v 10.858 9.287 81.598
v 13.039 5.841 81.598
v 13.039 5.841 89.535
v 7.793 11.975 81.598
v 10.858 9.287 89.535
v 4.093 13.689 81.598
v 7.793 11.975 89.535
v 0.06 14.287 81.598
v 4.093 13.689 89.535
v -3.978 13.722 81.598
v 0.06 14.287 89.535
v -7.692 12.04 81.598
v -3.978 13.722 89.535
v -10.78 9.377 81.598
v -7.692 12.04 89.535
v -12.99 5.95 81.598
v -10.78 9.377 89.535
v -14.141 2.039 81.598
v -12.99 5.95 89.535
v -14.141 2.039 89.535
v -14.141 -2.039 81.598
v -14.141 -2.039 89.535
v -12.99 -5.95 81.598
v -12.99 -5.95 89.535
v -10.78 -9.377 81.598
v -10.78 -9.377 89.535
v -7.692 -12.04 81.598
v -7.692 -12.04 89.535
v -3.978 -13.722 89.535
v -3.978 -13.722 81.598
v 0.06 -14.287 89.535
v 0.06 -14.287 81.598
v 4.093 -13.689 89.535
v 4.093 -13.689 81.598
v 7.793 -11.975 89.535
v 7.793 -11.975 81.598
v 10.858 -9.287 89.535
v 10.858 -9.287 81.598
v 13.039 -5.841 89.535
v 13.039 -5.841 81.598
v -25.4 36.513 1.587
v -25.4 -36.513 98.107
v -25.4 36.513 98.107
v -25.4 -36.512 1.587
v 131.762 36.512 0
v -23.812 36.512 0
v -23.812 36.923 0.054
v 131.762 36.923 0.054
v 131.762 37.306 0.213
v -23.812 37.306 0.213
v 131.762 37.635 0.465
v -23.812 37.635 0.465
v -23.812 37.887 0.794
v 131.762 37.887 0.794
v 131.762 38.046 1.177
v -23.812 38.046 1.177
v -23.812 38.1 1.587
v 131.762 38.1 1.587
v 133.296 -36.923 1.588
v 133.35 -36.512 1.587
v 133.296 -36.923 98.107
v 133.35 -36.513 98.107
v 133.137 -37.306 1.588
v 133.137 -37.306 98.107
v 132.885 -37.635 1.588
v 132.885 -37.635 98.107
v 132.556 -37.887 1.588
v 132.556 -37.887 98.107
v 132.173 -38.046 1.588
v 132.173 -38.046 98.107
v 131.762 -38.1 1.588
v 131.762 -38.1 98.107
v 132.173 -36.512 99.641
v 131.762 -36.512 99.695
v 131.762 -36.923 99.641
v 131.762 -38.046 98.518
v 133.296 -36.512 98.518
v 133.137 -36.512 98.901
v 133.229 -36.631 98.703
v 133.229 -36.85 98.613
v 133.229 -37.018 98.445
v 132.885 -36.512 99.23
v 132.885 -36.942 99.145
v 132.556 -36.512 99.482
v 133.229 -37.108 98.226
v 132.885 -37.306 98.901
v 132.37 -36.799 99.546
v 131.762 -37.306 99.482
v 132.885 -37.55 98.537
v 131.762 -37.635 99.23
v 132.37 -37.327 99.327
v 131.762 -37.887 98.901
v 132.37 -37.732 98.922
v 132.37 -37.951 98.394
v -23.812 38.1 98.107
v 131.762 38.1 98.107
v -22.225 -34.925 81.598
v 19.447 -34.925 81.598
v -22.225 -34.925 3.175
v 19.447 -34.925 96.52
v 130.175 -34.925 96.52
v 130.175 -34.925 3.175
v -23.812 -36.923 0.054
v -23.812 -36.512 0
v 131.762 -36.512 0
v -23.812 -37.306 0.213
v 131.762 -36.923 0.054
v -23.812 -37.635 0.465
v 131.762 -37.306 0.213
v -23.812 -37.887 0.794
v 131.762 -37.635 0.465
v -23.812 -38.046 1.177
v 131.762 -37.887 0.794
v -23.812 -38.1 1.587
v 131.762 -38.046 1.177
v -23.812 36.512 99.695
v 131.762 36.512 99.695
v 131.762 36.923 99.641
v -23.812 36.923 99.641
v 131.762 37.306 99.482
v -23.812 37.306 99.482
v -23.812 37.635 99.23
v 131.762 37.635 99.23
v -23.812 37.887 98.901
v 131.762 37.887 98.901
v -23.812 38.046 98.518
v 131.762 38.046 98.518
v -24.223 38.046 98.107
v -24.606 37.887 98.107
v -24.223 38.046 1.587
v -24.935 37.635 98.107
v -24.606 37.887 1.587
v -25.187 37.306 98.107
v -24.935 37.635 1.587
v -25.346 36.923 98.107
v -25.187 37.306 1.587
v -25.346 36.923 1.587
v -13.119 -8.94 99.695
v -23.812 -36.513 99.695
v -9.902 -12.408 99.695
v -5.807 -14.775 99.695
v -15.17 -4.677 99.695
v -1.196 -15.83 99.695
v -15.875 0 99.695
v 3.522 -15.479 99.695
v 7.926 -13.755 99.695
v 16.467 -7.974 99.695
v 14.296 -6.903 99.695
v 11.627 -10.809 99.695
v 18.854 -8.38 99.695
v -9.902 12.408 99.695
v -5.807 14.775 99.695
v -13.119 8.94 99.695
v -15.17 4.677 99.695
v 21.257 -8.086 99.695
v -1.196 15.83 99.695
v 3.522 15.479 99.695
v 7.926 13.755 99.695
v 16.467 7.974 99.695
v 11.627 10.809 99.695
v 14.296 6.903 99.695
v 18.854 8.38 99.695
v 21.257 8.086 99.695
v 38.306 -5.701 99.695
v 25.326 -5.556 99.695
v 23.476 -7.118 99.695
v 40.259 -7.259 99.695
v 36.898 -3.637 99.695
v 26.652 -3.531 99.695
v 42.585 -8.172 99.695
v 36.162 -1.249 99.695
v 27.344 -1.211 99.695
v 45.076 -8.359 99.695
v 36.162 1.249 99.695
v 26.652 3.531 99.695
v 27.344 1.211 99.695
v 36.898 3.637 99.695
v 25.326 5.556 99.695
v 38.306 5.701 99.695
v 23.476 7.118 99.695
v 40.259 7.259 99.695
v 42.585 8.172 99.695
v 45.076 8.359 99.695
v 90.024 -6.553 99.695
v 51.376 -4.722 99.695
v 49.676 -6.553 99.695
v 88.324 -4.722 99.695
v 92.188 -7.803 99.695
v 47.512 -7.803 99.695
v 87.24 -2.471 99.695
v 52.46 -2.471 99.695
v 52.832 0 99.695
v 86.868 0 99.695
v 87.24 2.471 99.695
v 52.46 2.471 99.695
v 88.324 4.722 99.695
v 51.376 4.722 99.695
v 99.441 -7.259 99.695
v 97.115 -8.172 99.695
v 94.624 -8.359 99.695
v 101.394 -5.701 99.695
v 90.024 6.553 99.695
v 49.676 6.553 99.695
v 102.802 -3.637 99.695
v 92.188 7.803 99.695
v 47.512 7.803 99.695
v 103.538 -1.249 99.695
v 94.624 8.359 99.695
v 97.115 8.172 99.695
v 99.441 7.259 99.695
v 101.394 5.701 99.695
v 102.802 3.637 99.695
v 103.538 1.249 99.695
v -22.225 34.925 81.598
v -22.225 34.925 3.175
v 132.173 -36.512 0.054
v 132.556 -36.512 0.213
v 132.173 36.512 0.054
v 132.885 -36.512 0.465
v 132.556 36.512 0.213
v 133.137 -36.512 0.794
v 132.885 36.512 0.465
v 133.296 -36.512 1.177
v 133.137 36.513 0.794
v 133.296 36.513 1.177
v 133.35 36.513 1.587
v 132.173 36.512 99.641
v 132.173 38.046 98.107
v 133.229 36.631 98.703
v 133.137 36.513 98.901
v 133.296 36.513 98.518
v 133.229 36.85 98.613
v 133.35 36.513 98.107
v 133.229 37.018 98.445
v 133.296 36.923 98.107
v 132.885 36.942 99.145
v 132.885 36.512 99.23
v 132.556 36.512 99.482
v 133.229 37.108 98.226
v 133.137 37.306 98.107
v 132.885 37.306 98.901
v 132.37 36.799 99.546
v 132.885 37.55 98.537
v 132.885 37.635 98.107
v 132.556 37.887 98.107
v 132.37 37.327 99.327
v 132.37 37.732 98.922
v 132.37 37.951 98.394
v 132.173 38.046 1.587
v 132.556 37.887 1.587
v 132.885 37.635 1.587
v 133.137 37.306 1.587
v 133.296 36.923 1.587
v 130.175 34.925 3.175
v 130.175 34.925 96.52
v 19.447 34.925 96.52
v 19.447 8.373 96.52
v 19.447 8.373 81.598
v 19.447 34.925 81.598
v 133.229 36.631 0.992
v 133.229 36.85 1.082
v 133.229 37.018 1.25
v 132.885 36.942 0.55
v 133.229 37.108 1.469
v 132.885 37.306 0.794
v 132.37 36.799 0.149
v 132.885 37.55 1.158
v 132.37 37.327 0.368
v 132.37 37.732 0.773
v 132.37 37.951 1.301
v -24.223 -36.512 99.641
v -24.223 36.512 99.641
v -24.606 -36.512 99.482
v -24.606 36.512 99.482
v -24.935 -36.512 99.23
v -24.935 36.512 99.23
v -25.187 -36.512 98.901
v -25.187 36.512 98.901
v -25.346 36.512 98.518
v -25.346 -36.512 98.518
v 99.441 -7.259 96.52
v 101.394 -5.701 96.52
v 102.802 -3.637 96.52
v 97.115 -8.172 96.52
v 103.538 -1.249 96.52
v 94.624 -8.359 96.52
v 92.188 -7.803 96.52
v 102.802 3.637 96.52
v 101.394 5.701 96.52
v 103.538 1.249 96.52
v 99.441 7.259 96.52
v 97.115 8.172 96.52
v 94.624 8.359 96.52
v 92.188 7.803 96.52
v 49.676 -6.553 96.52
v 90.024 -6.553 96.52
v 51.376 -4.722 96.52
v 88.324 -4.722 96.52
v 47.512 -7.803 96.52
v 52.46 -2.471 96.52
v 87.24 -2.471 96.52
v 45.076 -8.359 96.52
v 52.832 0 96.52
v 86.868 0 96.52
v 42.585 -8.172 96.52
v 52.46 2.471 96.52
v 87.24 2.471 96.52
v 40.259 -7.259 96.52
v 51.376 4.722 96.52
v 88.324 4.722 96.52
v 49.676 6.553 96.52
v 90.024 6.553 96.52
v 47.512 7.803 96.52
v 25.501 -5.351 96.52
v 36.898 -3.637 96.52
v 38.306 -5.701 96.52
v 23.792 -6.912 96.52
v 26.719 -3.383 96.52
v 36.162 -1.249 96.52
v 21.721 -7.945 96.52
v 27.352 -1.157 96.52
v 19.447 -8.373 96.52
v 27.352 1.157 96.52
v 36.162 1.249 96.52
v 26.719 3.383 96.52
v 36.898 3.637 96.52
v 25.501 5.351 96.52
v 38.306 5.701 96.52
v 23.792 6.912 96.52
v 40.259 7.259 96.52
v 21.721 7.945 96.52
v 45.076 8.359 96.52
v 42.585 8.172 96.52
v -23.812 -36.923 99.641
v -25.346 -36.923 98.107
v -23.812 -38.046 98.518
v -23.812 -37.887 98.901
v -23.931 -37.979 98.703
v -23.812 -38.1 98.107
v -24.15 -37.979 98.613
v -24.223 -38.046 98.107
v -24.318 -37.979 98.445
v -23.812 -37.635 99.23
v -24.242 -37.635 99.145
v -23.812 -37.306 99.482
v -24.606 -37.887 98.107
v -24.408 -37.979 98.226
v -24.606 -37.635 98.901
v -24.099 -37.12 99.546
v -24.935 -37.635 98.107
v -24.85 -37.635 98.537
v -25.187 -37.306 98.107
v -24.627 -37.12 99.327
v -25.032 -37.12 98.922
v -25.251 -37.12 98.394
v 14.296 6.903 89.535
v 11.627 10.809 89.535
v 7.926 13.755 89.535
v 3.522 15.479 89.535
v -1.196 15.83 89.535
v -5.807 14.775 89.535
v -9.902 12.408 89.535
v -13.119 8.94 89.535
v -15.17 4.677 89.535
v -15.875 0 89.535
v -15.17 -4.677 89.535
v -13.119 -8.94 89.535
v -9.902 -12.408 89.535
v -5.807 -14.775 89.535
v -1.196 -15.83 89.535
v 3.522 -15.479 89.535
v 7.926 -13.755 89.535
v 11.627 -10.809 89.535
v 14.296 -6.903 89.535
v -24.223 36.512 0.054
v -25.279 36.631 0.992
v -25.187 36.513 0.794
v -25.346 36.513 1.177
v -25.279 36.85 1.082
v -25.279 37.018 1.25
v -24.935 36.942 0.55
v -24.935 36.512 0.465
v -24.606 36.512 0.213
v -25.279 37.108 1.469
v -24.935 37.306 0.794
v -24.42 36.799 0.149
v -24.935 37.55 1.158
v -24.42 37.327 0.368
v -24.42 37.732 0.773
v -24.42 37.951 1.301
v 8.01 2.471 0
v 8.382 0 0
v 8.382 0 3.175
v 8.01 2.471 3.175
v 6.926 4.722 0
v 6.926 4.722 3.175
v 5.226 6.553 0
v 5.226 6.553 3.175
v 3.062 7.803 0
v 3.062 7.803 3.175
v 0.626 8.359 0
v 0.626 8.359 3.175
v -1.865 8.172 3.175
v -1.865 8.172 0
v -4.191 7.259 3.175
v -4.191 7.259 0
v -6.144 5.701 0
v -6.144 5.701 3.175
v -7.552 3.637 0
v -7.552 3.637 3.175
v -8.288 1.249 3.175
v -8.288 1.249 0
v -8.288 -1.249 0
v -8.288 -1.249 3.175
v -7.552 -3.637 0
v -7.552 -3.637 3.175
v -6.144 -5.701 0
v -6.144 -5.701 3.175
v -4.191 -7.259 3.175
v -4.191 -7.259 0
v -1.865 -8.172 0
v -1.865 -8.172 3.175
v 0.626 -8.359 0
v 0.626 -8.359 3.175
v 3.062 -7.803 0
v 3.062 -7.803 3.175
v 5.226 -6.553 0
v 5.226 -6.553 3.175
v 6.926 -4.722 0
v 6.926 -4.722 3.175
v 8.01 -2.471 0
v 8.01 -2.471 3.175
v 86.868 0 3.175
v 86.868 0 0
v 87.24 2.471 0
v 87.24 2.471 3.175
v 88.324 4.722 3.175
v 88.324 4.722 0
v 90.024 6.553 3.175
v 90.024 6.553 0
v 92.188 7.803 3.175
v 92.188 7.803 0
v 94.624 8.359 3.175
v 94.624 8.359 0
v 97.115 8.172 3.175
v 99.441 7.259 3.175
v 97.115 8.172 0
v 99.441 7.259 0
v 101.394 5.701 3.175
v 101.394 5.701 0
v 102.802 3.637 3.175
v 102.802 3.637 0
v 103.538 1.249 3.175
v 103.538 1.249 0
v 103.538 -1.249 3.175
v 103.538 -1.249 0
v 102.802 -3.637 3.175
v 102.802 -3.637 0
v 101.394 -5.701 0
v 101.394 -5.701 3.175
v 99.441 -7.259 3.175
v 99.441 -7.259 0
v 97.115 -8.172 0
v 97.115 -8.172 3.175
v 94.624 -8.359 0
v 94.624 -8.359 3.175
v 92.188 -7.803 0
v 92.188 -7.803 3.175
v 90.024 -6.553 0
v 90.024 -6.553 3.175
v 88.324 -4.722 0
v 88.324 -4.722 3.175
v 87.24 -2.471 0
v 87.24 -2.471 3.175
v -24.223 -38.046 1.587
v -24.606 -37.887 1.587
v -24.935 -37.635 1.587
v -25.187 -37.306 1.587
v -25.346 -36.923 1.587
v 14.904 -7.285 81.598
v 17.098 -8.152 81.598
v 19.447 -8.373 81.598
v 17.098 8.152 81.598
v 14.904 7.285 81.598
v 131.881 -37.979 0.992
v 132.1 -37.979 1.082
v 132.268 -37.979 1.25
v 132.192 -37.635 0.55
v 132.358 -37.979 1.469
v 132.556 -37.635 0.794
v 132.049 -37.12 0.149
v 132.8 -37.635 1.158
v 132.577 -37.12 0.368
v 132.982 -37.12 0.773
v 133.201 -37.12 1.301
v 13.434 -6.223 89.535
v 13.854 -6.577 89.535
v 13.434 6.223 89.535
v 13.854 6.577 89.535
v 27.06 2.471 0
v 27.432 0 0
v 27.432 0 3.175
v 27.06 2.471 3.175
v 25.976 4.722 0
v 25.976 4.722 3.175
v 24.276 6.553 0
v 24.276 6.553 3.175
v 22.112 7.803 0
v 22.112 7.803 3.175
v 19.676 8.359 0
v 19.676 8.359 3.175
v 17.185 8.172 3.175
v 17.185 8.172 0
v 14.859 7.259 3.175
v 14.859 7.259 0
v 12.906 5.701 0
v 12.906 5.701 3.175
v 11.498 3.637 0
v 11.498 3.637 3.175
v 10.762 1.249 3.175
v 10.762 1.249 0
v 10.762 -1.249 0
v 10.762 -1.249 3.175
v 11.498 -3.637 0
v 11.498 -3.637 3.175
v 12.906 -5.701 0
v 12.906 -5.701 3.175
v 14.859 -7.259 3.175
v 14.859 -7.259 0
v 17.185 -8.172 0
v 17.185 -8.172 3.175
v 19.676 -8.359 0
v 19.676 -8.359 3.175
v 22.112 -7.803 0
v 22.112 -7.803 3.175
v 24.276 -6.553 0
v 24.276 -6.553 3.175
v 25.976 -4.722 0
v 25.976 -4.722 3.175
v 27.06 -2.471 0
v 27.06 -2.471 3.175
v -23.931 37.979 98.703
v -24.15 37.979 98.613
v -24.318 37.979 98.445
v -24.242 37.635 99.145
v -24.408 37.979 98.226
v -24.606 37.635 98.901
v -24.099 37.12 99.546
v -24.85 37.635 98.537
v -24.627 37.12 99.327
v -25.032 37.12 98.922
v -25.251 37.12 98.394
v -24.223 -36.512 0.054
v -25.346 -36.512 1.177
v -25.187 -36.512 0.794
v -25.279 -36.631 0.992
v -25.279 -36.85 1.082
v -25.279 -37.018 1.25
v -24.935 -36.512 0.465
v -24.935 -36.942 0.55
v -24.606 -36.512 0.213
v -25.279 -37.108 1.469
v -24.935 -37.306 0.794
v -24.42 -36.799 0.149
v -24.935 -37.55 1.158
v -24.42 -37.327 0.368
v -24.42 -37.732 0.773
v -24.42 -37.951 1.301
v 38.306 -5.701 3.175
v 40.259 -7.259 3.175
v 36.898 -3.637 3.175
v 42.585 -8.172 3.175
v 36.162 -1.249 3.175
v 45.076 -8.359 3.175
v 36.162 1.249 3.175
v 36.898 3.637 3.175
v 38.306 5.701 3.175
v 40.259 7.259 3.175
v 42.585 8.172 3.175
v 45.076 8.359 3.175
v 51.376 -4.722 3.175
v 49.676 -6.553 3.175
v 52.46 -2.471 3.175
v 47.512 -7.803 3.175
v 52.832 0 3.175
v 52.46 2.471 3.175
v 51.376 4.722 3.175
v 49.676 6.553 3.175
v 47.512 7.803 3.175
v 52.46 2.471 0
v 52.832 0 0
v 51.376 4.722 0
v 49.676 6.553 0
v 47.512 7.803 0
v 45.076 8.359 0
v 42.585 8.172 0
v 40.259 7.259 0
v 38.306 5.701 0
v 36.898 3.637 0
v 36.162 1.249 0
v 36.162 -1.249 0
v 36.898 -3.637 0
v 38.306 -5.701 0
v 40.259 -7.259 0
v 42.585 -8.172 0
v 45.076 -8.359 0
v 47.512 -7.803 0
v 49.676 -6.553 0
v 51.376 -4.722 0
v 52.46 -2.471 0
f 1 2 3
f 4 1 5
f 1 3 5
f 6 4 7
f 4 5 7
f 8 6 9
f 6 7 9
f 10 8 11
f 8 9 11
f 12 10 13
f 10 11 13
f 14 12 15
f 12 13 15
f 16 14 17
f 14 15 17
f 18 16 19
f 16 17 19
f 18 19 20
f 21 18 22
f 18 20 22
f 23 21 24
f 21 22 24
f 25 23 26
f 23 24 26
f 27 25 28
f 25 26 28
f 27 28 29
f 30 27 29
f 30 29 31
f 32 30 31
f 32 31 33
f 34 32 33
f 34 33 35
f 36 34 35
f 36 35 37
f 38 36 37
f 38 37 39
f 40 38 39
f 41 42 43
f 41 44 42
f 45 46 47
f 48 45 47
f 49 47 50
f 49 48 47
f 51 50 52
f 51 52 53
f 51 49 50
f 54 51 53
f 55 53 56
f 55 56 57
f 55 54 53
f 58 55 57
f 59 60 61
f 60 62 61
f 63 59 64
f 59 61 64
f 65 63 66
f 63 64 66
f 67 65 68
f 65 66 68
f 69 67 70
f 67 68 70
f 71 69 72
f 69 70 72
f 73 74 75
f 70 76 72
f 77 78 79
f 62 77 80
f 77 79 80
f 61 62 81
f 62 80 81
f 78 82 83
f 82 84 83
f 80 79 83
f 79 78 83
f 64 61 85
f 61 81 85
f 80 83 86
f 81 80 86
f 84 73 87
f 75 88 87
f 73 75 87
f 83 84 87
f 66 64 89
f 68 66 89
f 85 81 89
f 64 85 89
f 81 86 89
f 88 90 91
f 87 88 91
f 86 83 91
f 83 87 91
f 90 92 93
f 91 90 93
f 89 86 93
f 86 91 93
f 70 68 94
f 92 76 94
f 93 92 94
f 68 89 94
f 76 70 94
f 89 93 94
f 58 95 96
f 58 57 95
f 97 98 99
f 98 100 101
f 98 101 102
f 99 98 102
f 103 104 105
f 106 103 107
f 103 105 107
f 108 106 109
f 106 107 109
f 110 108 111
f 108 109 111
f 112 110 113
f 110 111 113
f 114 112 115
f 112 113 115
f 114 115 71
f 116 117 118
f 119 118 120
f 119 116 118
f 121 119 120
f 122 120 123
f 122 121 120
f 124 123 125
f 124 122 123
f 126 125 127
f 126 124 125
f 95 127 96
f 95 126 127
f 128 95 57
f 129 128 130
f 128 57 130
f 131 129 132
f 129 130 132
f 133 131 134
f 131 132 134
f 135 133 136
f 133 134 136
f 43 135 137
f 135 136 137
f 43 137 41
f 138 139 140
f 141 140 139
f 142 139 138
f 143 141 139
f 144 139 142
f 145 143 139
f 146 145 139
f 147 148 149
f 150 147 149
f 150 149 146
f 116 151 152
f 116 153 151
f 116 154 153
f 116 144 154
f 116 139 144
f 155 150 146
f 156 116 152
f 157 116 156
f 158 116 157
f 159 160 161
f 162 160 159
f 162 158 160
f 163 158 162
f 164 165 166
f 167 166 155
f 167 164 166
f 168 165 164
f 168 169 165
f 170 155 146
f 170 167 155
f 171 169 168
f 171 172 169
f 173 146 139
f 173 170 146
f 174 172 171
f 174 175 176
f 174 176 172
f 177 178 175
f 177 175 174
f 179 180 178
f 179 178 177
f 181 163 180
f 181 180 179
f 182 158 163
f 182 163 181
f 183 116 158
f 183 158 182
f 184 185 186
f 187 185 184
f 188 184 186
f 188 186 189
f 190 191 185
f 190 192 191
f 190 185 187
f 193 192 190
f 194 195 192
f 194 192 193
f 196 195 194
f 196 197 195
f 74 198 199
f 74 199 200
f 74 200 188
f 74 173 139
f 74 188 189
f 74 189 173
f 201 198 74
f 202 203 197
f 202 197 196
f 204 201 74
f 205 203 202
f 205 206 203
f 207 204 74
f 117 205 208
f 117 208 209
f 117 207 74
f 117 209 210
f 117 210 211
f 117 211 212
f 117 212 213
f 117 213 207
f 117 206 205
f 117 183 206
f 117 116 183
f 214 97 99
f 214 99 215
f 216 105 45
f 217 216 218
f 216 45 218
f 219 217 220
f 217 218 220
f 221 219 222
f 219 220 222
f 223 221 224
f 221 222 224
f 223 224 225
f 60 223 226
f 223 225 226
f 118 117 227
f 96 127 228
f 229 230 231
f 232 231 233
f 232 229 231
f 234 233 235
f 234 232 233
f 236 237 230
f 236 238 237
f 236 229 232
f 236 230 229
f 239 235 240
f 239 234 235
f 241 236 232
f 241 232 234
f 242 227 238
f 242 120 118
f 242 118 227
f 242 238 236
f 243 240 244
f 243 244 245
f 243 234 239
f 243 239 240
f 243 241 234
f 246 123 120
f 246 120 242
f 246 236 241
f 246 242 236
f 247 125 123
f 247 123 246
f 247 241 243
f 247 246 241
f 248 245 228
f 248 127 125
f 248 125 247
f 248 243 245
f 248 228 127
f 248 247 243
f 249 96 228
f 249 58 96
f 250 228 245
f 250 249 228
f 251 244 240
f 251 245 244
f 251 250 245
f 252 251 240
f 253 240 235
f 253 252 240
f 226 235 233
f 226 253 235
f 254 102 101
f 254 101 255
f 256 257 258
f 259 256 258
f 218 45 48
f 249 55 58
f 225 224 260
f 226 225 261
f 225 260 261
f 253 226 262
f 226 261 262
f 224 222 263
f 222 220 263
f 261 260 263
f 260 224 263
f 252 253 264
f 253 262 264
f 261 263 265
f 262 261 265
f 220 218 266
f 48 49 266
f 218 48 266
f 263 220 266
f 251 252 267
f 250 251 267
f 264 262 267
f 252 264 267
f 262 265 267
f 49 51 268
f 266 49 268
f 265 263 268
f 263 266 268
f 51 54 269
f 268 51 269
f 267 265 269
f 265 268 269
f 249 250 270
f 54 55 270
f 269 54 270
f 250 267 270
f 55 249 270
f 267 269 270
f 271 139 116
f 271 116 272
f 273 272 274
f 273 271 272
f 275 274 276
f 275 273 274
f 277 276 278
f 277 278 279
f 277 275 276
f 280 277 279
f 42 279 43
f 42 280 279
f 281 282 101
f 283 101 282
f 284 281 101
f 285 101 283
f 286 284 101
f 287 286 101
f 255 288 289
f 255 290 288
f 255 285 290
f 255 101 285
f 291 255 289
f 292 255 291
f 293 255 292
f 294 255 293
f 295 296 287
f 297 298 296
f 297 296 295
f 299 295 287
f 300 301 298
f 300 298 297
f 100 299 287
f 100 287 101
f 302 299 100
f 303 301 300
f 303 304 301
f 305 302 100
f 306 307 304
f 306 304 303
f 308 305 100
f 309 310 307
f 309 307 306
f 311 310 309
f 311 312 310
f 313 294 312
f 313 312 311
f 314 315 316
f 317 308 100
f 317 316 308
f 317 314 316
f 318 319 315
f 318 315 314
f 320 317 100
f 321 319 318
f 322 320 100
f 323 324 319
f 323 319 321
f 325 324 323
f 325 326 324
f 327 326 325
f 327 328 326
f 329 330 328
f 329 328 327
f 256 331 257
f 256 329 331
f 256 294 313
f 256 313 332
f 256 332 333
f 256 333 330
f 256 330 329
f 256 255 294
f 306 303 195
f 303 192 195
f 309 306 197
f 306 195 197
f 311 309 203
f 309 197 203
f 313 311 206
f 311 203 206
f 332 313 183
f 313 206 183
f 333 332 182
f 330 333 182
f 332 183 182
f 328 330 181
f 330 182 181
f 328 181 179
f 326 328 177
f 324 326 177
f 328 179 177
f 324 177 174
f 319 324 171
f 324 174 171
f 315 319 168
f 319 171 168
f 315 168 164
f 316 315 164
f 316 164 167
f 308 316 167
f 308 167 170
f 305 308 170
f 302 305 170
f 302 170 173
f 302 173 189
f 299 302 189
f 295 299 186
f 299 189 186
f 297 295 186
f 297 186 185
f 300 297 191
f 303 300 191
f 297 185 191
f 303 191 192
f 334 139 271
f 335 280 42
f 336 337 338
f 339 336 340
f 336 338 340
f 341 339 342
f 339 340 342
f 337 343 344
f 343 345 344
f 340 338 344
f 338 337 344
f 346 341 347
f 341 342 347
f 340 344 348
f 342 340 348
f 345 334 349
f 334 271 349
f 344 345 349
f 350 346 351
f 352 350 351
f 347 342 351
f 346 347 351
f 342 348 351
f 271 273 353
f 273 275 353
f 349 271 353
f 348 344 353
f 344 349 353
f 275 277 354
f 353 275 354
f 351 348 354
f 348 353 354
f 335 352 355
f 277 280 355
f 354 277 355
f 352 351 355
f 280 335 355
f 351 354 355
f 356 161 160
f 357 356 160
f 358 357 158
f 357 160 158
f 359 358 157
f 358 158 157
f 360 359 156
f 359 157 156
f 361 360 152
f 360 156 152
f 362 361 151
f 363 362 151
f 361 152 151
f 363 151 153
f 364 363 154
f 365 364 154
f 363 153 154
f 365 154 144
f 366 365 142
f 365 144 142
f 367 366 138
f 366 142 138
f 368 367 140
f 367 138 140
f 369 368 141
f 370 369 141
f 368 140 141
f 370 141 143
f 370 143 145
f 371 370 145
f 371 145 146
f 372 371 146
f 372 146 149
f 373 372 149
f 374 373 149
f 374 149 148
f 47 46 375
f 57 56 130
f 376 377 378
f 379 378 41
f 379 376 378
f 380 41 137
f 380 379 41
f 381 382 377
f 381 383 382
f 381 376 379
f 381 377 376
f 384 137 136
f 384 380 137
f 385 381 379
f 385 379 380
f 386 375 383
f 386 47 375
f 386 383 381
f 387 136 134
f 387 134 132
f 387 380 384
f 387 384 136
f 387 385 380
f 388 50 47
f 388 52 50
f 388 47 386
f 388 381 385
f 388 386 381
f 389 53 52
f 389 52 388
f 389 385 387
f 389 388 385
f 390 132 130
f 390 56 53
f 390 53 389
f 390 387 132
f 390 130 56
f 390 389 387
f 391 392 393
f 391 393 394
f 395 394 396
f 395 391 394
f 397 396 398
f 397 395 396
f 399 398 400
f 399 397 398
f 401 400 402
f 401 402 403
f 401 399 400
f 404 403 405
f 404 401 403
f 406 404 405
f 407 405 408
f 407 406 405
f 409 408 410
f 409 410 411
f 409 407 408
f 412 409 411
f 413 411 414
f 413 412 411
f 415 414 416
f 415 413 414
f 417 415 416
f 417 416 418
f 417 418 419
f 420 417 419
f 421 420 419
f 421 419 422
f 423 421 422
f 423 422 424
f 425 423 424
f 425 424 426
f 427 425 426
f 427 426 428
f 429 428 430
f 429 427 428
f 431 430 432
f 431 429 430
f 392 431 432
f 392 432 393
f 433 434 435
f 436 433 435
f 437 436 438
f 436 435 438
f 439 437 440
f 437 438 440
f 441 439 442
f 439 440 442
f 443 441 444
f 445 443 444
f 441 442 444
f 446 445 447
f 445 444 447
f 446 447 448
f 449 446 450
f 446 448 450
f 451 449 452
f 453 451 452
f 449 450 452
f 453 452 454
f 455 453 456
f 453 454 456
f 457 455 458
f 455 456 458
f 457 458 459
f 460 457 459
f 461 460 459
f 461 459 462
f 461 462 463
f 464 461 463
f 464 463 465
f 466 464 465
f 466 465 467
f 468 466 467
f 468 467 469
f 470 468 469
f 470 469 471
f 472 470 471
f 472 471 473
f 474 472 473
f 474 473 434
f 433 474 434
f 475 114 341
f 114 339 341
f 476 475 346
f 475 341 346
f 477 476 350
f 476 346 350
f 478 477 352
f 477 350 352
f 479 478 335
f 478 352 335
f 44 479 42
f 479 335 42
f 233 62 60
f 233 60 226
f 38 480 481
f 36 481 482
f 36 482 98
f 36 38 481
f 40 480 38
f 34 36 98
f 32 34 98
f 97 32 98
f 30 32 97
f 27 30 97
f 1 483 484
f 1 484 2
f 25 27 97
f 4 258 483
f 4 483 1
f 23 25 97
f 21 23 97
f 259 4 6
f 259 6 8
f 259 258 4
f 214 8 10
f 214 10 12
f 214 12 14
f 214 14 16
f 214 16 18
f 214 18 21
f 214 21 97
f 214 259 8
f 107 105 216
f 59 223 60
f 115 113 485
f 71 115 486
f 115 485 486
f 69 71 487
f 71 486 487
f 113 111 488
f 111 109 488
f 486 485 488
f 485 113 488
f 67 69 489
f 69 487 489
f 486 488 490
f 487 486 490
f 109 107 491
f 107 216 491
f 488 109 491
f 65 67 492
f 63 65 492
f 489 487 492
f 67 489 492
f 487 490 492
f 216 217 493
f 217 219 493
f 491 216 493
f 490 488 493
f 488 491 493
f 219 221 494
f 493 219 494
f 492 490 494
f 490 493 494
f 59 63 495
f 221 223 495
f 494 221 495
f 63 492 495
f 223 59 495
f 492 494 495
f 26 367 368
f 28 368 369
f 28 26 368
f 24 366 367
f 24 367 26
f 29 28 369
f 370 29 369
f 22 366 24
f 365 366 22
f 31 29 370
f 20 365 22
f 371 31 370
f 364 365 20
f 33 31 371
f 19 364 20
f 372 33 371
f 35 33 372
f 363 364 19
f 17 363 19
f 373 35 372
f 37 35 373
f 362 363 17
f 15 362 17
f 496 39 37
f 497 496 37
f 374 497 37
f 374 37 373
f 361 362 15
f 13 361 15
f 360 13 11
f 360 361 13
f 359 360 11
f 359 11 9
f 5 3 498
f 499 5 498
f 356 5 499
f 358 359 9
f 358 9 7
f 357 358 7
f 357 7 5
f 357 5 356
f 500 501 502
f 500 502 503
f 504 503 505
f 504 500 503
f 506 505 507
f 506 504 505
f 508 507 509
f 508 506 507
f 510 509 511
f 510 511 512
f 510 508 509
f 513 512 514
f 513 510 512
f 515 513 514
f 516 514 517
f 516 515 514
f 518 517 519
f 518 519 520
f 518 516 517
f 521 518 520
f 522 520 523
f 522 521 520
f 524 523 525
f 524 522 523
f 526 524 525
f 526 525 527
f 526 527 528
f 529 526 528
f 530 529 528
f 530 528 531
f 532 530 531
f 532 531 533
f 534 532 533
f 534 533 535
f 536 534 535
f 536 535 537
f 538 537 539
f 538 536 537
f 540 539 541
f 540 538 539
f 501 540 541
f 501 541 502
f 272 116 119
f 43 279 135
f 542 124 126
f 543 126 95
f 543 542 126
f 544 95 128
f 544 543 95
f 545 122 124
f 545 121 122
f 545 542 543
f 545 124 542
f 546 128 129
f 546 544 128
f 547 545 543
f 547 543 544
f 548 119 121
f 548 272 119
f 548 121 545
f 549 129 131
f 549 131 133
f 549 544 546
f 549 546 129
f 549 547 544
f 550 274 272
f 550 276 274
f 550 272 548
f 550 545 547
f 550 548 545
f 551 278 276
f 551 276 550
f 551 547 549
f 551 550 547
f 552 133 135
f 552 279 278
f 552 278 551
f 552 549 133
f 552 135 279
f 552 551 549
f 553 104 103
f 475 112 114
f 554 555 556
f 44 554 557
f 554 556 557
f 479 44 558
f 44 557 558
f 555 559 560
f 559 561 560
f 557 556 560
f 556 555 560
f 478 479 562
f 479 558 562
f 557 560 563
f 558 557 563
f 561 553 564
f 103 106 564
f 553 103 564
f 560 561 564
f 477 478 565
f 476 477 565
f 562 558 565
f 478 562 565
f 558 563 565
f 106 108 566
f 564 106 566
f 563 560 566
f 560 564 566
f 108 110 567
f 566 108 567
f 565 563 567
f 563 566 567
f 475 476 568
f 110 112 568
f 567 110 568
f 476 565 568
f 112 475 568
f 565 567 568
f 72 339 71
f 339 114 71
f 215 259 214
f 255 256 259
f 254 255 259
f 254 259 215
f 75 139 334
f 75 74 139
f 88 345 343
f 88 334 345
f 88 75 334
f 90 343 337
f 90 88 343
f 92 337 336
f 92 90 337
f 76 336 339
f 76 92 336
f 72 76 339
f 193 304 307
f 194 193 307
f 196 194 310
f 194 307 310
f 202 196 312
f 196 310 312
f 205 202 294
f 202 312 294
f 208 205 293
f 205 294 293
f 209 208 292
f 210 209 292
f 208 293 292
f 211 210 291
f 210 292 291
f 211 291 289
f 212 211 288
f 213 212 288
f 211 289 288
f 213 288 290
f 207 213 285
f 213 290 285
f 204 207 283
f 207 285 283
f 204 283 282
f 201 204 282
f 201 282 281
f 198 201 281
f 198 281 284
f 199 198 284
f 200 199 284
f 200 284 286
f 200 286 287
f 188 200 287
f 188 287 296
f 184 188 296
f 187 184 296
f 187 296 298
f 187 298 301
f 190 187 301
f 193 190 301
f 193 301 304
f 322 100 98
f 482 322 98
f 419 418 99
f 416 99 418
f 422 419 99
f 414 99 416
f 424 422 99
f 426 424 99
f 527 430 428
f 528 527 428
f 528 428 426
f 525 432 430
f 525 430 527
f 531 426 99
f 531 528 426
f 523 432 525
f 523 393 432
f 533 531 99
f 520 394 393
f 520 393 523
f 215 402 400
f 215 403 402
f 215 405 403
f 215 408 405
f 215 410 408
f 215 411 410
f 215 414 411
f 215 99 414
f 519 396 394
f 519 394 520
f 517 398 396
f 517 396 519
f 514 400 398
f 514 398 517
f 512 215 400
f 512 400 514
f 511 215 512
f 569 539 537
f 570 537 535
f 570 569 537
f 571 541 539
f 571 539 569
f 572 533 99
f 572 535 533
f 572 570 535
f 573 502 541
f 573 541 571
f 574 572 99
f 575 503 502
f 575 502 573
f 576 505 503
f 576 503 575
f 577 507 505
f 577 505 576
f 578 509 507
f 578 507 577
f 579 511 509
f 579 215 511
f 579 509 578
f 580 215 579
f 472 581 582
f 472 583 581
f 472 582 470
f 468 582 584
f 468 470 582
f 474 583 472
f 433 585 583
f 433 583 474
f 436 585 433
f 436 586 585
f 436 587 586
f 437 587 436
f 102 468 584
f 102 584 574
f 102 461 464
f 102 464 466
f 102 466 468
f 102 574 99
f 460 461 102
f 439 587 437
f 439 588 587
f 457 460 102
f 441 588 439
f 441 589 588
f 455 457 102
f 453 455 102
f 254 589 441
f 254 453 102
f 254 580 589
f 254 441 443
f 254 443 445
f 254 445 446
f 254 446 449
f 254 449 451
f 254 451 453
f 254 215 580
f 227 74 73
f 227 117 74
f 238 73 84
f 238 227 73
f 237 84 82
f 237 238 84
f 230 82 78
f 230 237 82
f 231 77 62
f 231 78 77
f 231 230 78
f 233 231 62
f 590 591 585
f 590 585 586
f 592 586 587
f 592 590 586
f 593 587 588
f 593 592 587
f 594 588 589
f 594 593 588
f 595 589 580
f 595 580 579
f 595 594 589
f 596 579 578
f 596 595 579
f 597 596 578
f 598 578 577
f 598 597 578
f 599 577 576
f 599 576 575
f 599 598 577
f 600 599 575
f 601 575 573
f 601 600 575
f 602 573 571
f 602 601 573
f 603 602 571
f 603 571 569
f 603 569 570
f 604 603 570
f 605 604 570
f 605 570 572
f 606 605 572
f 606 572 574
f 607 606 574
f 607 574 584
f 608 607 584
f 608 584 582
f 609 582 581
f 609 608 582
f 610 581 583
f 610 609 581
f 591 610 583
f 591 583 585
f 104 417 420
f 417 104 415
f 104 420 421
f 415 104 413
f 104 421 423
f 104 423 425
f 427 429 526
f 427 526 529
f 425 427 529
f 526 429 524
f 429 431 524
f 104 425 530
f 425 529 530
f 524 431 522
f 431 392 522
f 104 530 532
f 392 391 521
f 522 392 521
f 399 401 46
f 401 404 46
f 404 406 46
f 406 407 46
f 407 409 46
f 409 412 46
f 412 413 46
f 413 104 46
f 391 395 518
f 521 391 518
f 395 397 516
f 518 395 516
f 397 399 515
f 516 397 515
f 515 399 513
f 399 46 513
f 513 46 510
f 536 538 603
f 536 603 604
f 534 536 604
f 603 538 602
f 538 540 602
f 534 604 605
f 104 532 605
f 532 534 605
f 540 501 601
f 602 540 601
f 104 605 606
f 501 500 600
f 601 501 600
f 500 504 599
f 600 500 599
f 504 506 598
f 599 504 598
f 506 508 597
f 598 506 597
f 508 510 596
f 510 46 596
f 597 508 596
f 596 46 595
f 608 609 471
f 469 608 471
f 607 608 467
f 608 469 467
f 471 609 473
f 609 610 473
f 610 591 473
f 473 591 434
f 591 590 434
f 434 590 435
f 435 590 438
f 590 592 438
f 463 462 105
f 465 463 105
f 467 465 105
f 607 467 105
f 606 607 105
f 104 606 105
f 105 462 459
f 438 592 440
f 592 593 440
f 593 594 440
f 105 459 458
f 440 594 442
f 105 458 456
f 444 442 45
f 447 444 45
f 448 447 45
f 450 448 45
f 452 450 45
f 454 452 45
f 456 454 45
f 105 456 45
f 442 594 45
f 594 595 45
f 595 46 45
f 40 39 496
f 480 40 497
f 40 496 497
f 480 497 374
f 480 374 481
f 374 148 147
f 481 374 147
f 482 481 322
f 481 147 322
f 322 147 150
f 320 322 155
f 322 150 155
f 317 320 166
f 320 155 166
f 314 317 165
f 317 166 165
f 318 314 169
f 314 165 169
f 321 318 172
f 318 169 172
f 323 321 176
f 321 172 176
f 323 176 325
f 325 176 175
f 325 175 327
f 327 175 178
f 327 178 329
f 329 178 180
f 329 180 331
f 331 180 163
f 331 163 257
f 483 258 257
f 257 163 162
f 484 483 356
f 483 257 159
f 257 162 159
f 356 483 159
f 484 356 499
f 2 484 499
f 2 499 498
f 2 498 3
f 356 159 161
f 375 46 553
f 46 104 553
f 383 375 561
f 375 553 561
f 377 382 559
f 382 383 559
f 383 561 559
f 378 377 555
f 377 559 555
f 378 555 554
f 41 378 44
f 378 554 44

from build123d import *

# Parameters (mm, degrees)
SKETCH1_W           = 158.75
SKETCH1_H           = 76.2
SKETCH1_R           = 8.382
BOSS_EXTRUDE1_DEPTH = 3.175
SKETCH2_W           = 3.175
SKETCH2_H           = 76.2
BOSS_EXTRUDE2_DEPTH = 96.52
SKETCH5_W           = 38.496875
SKETCH5_H           = 14.9225
BOSS_EXTRUDE4_DEPTH = 76.2
CUT_EXTRUDE3_REACH  = 172.801
SKETCH10_R          = 8.382
SKETCH10_3_R        = 8.382
SKETCH10_3_R_2      = 15.875
CUT_EXTRUDE4_DEPTH  = 10.16
CUT_EXTRUDE5_REACH  = 167.077
SKETCH11_R          = 14.2875
SKETCH12_R          = 8.382
CUT_EXTRUDE6_DEPTH  = 171.800835844
BOSS_EXTRUDE5_REACH = 193.291
SKETCH13_W          = 99.695
SKETCH13_H          = 3.175
FILLET1_R           = 1.5875


with BuildPart() as part:
    # Sketch1 → Boss-Extrude1 (new body)
    with BuildSketch(Plane.XY):
        with Locations((53.975, 0)):
            Rectangle(SKETCH1_W, SKETCH1_H)
        Circle(SKETCH1_R, mode=Mode.SUBTRACT)
        with Locations((19.05, 0)):
            Circle(SKETCH1_R, mode=Mode.SUBTRACT)
        with Locations((44.45, 0)):
            Circle(SKETCH1_R, mode=Mode.SUBTRACT)
    extrude(amount=BOSS_EXTRUDE1_DEPTH)

    # Sketch2 → Boss-Extrude2 (add)
    with BuildSketch(Plane.XY.offset(3.175)):
        with Locations((-23.8125, 0)):
            Rectangle(SKETCH2_W, SKETCH2_H)
        with Locations((131.7625, 0)):
            Rectangle(SKETCH2_W, SKETCH2_H)
    extrude(amount=BOSS_EXTRUDE2_DEPTH)

    # Sketch5 → Boss-Extrude4 (add)
    with BuildSketch(Plane(origin=(0, 38.1, 0), x_dir=(1, 0, 0), z_dir=(0, 1, 0))):
        with Locations((-2.9765625, -92.23375)):
            Rectangle(SKETCH5_W, SKETCH5_H)
        Polygon((-22.225, -81.5975), (-22.225, -84.7725), (16.271875, -84.7725), (16.271875, -99.695), (130.175, -99.695), (130.175, -96.52), (19.446875, -96.52), (19.446875, -81.5975), align=None)
    extrude(amount=-BOSS_EXTRUDE4_DEPTH)

    # Sketch10 → Cut-Extrude3 (cut, up to next)
    with BuildSketch(Plane.XY.offset(99.695), mode=Mode.PRIVATE) as cut_extrude3_sk1:
        with Locations((19.05, 0)):
            Circle(SKETCH10_R)
    cut_extrude3_tool1 = extrude(cut_extrude3_sk1.sketch, amount=-CUT_EXTRUDE3_REACH, mode=Mode.PRIVATE) & part.part
    # Sketch10 → Cut-Extrude3 (cut, up to next)
    with BuildSketch(Plane.XY.offset(99.695), mode=Mode.PRIVATE) as cut_extrude3_sk2:
        with Locations((44.45, 0)):
            Circle(SKETCH10_R)
    cut_extrude3_tool2 = extrude(cut_extrude3_sk2.sketch, amount=-CUT_EXTRUDE3_REACH, mode=Mode.PRIVATE) & part.part
    add(cut_extrude3_tool1.solids().sort_by_distance((19.05, 0, 99.695))[0], mode=Mode.SUBTRACT)
    add(cut_extrude3_tool2.solids().sort_by_distance((44.45, 0, 99.695))[0], mode=Mode.SUBTRACT)

    # Sketch10<3> → Cut-Extrude4 (cut)
    with BuildSketch(Plane.XY.offset(99.695)):
        with Locations((19.05, 0)):
            Circle(SKETCH10_3_R)
        Circle(SKETCH10_3_R_2)
    extrude(amount=-CUT_EXTRUDE4_DEPTH, mode=Mode.SUBTRACT)

    # Sketch11 → Cut-Extrude5 (cut, up to next)
    with BuildSketch(Plane.XY.offset(89.535), mode=Mode.PRIVATE) as cut_extrude5_sk1:
        Circle(SKETCH11_R)
    cut_extrude5_tool1 = extrude(cut_extrude5_sk1.sketch, amount=-CUT_EXTRUDE5_REACH, mode=Mode.PRIVATE) & part.part
    add(cut_extrude5_tool1.solids().sort_by_distance((0, 0, 89.535))[0], mode=Mode.SUBTRACT)

    # Sketch12 → Cut-Extrude6 (cut, through all)
    with BuildSketch(Plane(origin=(0, 0, 0), x_dir=(-1, 0, 0), z_dir=(0, 0, -1))):
        with Locations((-95.25, 0)):
            Circle(SKETCH12_R)
    extrude(amount=-CUT_EXTRUDE6_DEPTH, mode=Mode.SUBTRACT)

    # Boss-Extrude5: up to this face of the body (flat: up to its plane)
    boss_extrude5_end = Plane(part.part.faces().sort_by_distance((-25.4, 0, 49.8475))[0])
    # Sketch13 → Boss-Extrude5 (add, up to the picked face)
    with BuildSketch(Plane(origin=(133.35, 0, 0), x_dir=(0, 0, -1), z_dir=(1, 0, 0)), mode=Mode.PRIVATE) as boss_extrude5_sk1:
        with Locations((-49.8475, -36.5125)):
            Rectangle(SKETCH13_W, SKETCH13_H)
    boss_extrude5_tool1 = split(extrude(boss_extrude5_sk1.sketch, amount=-BOSS_EXTRUDE5_REACH, mode=Mode.PRIVATE), bisect_by=boss_extrude5_end, keep=Keep.BOTH, mode=Mode.PRIVATE)
    # Sketch13 → Boss-Extrude5 (add, up to the picked face)
    with BuildSketch(Plane(origin=(133.35, 0, 0), x_dir=(0, 0, -1), z_dir=(1, 0, 0)), mode=Mode.PRIVATE) as boss_extrude5_sk2:
        with Locations((-49.8475, 36.5125)):
            Rectangle(SKETCH13_W, SKETCH13_H)
    boss_extrude5_tool2 = split(extrude(boss_extrude5_sk2.sketch, amount=-BOSS_EXTRUDE5_REACH, mode=Mode.PRIVATE), bisect_by=boss_extrude5_end, keep=Keep.BOTH, mode=Mode.PRIVATE)
    add(boss_extrude5_tool1.solids().sort_by(Axis((133.35, -36.5125, 49.8475), (-1, 0, 0)))[0])
    add(boss_extrude5_tool2.solids().sort_by(Axis((133.35, 36.5125, 49.8475), (-1, 0, 0)))[0])

    # Fillet1
    fillet1_edges = [part.edges().sort_by_distance(p)[0] for p in [
        (-25.4, 0, 99.695),
        (53.975, -38.1, 99.695),
        (53.975, 38.1, 99.695),
        (133.35, 0, 99.695),
        (53.975, 38.1, 0),
        (133.35, 0, 0),
        (53.975, -38.1, 0),
        (-25.4, 0, 0),
        (-25.4, 38.1, 49.8475),
        (133.35, 38.1, 49.8475),
        (133.35, -38.1, 49.8475),
        (-25.4, -38.1, 49.8475),
    ]]
    fillet(fillet1_edges, radius=FILLET1_R)


solid = part.part
